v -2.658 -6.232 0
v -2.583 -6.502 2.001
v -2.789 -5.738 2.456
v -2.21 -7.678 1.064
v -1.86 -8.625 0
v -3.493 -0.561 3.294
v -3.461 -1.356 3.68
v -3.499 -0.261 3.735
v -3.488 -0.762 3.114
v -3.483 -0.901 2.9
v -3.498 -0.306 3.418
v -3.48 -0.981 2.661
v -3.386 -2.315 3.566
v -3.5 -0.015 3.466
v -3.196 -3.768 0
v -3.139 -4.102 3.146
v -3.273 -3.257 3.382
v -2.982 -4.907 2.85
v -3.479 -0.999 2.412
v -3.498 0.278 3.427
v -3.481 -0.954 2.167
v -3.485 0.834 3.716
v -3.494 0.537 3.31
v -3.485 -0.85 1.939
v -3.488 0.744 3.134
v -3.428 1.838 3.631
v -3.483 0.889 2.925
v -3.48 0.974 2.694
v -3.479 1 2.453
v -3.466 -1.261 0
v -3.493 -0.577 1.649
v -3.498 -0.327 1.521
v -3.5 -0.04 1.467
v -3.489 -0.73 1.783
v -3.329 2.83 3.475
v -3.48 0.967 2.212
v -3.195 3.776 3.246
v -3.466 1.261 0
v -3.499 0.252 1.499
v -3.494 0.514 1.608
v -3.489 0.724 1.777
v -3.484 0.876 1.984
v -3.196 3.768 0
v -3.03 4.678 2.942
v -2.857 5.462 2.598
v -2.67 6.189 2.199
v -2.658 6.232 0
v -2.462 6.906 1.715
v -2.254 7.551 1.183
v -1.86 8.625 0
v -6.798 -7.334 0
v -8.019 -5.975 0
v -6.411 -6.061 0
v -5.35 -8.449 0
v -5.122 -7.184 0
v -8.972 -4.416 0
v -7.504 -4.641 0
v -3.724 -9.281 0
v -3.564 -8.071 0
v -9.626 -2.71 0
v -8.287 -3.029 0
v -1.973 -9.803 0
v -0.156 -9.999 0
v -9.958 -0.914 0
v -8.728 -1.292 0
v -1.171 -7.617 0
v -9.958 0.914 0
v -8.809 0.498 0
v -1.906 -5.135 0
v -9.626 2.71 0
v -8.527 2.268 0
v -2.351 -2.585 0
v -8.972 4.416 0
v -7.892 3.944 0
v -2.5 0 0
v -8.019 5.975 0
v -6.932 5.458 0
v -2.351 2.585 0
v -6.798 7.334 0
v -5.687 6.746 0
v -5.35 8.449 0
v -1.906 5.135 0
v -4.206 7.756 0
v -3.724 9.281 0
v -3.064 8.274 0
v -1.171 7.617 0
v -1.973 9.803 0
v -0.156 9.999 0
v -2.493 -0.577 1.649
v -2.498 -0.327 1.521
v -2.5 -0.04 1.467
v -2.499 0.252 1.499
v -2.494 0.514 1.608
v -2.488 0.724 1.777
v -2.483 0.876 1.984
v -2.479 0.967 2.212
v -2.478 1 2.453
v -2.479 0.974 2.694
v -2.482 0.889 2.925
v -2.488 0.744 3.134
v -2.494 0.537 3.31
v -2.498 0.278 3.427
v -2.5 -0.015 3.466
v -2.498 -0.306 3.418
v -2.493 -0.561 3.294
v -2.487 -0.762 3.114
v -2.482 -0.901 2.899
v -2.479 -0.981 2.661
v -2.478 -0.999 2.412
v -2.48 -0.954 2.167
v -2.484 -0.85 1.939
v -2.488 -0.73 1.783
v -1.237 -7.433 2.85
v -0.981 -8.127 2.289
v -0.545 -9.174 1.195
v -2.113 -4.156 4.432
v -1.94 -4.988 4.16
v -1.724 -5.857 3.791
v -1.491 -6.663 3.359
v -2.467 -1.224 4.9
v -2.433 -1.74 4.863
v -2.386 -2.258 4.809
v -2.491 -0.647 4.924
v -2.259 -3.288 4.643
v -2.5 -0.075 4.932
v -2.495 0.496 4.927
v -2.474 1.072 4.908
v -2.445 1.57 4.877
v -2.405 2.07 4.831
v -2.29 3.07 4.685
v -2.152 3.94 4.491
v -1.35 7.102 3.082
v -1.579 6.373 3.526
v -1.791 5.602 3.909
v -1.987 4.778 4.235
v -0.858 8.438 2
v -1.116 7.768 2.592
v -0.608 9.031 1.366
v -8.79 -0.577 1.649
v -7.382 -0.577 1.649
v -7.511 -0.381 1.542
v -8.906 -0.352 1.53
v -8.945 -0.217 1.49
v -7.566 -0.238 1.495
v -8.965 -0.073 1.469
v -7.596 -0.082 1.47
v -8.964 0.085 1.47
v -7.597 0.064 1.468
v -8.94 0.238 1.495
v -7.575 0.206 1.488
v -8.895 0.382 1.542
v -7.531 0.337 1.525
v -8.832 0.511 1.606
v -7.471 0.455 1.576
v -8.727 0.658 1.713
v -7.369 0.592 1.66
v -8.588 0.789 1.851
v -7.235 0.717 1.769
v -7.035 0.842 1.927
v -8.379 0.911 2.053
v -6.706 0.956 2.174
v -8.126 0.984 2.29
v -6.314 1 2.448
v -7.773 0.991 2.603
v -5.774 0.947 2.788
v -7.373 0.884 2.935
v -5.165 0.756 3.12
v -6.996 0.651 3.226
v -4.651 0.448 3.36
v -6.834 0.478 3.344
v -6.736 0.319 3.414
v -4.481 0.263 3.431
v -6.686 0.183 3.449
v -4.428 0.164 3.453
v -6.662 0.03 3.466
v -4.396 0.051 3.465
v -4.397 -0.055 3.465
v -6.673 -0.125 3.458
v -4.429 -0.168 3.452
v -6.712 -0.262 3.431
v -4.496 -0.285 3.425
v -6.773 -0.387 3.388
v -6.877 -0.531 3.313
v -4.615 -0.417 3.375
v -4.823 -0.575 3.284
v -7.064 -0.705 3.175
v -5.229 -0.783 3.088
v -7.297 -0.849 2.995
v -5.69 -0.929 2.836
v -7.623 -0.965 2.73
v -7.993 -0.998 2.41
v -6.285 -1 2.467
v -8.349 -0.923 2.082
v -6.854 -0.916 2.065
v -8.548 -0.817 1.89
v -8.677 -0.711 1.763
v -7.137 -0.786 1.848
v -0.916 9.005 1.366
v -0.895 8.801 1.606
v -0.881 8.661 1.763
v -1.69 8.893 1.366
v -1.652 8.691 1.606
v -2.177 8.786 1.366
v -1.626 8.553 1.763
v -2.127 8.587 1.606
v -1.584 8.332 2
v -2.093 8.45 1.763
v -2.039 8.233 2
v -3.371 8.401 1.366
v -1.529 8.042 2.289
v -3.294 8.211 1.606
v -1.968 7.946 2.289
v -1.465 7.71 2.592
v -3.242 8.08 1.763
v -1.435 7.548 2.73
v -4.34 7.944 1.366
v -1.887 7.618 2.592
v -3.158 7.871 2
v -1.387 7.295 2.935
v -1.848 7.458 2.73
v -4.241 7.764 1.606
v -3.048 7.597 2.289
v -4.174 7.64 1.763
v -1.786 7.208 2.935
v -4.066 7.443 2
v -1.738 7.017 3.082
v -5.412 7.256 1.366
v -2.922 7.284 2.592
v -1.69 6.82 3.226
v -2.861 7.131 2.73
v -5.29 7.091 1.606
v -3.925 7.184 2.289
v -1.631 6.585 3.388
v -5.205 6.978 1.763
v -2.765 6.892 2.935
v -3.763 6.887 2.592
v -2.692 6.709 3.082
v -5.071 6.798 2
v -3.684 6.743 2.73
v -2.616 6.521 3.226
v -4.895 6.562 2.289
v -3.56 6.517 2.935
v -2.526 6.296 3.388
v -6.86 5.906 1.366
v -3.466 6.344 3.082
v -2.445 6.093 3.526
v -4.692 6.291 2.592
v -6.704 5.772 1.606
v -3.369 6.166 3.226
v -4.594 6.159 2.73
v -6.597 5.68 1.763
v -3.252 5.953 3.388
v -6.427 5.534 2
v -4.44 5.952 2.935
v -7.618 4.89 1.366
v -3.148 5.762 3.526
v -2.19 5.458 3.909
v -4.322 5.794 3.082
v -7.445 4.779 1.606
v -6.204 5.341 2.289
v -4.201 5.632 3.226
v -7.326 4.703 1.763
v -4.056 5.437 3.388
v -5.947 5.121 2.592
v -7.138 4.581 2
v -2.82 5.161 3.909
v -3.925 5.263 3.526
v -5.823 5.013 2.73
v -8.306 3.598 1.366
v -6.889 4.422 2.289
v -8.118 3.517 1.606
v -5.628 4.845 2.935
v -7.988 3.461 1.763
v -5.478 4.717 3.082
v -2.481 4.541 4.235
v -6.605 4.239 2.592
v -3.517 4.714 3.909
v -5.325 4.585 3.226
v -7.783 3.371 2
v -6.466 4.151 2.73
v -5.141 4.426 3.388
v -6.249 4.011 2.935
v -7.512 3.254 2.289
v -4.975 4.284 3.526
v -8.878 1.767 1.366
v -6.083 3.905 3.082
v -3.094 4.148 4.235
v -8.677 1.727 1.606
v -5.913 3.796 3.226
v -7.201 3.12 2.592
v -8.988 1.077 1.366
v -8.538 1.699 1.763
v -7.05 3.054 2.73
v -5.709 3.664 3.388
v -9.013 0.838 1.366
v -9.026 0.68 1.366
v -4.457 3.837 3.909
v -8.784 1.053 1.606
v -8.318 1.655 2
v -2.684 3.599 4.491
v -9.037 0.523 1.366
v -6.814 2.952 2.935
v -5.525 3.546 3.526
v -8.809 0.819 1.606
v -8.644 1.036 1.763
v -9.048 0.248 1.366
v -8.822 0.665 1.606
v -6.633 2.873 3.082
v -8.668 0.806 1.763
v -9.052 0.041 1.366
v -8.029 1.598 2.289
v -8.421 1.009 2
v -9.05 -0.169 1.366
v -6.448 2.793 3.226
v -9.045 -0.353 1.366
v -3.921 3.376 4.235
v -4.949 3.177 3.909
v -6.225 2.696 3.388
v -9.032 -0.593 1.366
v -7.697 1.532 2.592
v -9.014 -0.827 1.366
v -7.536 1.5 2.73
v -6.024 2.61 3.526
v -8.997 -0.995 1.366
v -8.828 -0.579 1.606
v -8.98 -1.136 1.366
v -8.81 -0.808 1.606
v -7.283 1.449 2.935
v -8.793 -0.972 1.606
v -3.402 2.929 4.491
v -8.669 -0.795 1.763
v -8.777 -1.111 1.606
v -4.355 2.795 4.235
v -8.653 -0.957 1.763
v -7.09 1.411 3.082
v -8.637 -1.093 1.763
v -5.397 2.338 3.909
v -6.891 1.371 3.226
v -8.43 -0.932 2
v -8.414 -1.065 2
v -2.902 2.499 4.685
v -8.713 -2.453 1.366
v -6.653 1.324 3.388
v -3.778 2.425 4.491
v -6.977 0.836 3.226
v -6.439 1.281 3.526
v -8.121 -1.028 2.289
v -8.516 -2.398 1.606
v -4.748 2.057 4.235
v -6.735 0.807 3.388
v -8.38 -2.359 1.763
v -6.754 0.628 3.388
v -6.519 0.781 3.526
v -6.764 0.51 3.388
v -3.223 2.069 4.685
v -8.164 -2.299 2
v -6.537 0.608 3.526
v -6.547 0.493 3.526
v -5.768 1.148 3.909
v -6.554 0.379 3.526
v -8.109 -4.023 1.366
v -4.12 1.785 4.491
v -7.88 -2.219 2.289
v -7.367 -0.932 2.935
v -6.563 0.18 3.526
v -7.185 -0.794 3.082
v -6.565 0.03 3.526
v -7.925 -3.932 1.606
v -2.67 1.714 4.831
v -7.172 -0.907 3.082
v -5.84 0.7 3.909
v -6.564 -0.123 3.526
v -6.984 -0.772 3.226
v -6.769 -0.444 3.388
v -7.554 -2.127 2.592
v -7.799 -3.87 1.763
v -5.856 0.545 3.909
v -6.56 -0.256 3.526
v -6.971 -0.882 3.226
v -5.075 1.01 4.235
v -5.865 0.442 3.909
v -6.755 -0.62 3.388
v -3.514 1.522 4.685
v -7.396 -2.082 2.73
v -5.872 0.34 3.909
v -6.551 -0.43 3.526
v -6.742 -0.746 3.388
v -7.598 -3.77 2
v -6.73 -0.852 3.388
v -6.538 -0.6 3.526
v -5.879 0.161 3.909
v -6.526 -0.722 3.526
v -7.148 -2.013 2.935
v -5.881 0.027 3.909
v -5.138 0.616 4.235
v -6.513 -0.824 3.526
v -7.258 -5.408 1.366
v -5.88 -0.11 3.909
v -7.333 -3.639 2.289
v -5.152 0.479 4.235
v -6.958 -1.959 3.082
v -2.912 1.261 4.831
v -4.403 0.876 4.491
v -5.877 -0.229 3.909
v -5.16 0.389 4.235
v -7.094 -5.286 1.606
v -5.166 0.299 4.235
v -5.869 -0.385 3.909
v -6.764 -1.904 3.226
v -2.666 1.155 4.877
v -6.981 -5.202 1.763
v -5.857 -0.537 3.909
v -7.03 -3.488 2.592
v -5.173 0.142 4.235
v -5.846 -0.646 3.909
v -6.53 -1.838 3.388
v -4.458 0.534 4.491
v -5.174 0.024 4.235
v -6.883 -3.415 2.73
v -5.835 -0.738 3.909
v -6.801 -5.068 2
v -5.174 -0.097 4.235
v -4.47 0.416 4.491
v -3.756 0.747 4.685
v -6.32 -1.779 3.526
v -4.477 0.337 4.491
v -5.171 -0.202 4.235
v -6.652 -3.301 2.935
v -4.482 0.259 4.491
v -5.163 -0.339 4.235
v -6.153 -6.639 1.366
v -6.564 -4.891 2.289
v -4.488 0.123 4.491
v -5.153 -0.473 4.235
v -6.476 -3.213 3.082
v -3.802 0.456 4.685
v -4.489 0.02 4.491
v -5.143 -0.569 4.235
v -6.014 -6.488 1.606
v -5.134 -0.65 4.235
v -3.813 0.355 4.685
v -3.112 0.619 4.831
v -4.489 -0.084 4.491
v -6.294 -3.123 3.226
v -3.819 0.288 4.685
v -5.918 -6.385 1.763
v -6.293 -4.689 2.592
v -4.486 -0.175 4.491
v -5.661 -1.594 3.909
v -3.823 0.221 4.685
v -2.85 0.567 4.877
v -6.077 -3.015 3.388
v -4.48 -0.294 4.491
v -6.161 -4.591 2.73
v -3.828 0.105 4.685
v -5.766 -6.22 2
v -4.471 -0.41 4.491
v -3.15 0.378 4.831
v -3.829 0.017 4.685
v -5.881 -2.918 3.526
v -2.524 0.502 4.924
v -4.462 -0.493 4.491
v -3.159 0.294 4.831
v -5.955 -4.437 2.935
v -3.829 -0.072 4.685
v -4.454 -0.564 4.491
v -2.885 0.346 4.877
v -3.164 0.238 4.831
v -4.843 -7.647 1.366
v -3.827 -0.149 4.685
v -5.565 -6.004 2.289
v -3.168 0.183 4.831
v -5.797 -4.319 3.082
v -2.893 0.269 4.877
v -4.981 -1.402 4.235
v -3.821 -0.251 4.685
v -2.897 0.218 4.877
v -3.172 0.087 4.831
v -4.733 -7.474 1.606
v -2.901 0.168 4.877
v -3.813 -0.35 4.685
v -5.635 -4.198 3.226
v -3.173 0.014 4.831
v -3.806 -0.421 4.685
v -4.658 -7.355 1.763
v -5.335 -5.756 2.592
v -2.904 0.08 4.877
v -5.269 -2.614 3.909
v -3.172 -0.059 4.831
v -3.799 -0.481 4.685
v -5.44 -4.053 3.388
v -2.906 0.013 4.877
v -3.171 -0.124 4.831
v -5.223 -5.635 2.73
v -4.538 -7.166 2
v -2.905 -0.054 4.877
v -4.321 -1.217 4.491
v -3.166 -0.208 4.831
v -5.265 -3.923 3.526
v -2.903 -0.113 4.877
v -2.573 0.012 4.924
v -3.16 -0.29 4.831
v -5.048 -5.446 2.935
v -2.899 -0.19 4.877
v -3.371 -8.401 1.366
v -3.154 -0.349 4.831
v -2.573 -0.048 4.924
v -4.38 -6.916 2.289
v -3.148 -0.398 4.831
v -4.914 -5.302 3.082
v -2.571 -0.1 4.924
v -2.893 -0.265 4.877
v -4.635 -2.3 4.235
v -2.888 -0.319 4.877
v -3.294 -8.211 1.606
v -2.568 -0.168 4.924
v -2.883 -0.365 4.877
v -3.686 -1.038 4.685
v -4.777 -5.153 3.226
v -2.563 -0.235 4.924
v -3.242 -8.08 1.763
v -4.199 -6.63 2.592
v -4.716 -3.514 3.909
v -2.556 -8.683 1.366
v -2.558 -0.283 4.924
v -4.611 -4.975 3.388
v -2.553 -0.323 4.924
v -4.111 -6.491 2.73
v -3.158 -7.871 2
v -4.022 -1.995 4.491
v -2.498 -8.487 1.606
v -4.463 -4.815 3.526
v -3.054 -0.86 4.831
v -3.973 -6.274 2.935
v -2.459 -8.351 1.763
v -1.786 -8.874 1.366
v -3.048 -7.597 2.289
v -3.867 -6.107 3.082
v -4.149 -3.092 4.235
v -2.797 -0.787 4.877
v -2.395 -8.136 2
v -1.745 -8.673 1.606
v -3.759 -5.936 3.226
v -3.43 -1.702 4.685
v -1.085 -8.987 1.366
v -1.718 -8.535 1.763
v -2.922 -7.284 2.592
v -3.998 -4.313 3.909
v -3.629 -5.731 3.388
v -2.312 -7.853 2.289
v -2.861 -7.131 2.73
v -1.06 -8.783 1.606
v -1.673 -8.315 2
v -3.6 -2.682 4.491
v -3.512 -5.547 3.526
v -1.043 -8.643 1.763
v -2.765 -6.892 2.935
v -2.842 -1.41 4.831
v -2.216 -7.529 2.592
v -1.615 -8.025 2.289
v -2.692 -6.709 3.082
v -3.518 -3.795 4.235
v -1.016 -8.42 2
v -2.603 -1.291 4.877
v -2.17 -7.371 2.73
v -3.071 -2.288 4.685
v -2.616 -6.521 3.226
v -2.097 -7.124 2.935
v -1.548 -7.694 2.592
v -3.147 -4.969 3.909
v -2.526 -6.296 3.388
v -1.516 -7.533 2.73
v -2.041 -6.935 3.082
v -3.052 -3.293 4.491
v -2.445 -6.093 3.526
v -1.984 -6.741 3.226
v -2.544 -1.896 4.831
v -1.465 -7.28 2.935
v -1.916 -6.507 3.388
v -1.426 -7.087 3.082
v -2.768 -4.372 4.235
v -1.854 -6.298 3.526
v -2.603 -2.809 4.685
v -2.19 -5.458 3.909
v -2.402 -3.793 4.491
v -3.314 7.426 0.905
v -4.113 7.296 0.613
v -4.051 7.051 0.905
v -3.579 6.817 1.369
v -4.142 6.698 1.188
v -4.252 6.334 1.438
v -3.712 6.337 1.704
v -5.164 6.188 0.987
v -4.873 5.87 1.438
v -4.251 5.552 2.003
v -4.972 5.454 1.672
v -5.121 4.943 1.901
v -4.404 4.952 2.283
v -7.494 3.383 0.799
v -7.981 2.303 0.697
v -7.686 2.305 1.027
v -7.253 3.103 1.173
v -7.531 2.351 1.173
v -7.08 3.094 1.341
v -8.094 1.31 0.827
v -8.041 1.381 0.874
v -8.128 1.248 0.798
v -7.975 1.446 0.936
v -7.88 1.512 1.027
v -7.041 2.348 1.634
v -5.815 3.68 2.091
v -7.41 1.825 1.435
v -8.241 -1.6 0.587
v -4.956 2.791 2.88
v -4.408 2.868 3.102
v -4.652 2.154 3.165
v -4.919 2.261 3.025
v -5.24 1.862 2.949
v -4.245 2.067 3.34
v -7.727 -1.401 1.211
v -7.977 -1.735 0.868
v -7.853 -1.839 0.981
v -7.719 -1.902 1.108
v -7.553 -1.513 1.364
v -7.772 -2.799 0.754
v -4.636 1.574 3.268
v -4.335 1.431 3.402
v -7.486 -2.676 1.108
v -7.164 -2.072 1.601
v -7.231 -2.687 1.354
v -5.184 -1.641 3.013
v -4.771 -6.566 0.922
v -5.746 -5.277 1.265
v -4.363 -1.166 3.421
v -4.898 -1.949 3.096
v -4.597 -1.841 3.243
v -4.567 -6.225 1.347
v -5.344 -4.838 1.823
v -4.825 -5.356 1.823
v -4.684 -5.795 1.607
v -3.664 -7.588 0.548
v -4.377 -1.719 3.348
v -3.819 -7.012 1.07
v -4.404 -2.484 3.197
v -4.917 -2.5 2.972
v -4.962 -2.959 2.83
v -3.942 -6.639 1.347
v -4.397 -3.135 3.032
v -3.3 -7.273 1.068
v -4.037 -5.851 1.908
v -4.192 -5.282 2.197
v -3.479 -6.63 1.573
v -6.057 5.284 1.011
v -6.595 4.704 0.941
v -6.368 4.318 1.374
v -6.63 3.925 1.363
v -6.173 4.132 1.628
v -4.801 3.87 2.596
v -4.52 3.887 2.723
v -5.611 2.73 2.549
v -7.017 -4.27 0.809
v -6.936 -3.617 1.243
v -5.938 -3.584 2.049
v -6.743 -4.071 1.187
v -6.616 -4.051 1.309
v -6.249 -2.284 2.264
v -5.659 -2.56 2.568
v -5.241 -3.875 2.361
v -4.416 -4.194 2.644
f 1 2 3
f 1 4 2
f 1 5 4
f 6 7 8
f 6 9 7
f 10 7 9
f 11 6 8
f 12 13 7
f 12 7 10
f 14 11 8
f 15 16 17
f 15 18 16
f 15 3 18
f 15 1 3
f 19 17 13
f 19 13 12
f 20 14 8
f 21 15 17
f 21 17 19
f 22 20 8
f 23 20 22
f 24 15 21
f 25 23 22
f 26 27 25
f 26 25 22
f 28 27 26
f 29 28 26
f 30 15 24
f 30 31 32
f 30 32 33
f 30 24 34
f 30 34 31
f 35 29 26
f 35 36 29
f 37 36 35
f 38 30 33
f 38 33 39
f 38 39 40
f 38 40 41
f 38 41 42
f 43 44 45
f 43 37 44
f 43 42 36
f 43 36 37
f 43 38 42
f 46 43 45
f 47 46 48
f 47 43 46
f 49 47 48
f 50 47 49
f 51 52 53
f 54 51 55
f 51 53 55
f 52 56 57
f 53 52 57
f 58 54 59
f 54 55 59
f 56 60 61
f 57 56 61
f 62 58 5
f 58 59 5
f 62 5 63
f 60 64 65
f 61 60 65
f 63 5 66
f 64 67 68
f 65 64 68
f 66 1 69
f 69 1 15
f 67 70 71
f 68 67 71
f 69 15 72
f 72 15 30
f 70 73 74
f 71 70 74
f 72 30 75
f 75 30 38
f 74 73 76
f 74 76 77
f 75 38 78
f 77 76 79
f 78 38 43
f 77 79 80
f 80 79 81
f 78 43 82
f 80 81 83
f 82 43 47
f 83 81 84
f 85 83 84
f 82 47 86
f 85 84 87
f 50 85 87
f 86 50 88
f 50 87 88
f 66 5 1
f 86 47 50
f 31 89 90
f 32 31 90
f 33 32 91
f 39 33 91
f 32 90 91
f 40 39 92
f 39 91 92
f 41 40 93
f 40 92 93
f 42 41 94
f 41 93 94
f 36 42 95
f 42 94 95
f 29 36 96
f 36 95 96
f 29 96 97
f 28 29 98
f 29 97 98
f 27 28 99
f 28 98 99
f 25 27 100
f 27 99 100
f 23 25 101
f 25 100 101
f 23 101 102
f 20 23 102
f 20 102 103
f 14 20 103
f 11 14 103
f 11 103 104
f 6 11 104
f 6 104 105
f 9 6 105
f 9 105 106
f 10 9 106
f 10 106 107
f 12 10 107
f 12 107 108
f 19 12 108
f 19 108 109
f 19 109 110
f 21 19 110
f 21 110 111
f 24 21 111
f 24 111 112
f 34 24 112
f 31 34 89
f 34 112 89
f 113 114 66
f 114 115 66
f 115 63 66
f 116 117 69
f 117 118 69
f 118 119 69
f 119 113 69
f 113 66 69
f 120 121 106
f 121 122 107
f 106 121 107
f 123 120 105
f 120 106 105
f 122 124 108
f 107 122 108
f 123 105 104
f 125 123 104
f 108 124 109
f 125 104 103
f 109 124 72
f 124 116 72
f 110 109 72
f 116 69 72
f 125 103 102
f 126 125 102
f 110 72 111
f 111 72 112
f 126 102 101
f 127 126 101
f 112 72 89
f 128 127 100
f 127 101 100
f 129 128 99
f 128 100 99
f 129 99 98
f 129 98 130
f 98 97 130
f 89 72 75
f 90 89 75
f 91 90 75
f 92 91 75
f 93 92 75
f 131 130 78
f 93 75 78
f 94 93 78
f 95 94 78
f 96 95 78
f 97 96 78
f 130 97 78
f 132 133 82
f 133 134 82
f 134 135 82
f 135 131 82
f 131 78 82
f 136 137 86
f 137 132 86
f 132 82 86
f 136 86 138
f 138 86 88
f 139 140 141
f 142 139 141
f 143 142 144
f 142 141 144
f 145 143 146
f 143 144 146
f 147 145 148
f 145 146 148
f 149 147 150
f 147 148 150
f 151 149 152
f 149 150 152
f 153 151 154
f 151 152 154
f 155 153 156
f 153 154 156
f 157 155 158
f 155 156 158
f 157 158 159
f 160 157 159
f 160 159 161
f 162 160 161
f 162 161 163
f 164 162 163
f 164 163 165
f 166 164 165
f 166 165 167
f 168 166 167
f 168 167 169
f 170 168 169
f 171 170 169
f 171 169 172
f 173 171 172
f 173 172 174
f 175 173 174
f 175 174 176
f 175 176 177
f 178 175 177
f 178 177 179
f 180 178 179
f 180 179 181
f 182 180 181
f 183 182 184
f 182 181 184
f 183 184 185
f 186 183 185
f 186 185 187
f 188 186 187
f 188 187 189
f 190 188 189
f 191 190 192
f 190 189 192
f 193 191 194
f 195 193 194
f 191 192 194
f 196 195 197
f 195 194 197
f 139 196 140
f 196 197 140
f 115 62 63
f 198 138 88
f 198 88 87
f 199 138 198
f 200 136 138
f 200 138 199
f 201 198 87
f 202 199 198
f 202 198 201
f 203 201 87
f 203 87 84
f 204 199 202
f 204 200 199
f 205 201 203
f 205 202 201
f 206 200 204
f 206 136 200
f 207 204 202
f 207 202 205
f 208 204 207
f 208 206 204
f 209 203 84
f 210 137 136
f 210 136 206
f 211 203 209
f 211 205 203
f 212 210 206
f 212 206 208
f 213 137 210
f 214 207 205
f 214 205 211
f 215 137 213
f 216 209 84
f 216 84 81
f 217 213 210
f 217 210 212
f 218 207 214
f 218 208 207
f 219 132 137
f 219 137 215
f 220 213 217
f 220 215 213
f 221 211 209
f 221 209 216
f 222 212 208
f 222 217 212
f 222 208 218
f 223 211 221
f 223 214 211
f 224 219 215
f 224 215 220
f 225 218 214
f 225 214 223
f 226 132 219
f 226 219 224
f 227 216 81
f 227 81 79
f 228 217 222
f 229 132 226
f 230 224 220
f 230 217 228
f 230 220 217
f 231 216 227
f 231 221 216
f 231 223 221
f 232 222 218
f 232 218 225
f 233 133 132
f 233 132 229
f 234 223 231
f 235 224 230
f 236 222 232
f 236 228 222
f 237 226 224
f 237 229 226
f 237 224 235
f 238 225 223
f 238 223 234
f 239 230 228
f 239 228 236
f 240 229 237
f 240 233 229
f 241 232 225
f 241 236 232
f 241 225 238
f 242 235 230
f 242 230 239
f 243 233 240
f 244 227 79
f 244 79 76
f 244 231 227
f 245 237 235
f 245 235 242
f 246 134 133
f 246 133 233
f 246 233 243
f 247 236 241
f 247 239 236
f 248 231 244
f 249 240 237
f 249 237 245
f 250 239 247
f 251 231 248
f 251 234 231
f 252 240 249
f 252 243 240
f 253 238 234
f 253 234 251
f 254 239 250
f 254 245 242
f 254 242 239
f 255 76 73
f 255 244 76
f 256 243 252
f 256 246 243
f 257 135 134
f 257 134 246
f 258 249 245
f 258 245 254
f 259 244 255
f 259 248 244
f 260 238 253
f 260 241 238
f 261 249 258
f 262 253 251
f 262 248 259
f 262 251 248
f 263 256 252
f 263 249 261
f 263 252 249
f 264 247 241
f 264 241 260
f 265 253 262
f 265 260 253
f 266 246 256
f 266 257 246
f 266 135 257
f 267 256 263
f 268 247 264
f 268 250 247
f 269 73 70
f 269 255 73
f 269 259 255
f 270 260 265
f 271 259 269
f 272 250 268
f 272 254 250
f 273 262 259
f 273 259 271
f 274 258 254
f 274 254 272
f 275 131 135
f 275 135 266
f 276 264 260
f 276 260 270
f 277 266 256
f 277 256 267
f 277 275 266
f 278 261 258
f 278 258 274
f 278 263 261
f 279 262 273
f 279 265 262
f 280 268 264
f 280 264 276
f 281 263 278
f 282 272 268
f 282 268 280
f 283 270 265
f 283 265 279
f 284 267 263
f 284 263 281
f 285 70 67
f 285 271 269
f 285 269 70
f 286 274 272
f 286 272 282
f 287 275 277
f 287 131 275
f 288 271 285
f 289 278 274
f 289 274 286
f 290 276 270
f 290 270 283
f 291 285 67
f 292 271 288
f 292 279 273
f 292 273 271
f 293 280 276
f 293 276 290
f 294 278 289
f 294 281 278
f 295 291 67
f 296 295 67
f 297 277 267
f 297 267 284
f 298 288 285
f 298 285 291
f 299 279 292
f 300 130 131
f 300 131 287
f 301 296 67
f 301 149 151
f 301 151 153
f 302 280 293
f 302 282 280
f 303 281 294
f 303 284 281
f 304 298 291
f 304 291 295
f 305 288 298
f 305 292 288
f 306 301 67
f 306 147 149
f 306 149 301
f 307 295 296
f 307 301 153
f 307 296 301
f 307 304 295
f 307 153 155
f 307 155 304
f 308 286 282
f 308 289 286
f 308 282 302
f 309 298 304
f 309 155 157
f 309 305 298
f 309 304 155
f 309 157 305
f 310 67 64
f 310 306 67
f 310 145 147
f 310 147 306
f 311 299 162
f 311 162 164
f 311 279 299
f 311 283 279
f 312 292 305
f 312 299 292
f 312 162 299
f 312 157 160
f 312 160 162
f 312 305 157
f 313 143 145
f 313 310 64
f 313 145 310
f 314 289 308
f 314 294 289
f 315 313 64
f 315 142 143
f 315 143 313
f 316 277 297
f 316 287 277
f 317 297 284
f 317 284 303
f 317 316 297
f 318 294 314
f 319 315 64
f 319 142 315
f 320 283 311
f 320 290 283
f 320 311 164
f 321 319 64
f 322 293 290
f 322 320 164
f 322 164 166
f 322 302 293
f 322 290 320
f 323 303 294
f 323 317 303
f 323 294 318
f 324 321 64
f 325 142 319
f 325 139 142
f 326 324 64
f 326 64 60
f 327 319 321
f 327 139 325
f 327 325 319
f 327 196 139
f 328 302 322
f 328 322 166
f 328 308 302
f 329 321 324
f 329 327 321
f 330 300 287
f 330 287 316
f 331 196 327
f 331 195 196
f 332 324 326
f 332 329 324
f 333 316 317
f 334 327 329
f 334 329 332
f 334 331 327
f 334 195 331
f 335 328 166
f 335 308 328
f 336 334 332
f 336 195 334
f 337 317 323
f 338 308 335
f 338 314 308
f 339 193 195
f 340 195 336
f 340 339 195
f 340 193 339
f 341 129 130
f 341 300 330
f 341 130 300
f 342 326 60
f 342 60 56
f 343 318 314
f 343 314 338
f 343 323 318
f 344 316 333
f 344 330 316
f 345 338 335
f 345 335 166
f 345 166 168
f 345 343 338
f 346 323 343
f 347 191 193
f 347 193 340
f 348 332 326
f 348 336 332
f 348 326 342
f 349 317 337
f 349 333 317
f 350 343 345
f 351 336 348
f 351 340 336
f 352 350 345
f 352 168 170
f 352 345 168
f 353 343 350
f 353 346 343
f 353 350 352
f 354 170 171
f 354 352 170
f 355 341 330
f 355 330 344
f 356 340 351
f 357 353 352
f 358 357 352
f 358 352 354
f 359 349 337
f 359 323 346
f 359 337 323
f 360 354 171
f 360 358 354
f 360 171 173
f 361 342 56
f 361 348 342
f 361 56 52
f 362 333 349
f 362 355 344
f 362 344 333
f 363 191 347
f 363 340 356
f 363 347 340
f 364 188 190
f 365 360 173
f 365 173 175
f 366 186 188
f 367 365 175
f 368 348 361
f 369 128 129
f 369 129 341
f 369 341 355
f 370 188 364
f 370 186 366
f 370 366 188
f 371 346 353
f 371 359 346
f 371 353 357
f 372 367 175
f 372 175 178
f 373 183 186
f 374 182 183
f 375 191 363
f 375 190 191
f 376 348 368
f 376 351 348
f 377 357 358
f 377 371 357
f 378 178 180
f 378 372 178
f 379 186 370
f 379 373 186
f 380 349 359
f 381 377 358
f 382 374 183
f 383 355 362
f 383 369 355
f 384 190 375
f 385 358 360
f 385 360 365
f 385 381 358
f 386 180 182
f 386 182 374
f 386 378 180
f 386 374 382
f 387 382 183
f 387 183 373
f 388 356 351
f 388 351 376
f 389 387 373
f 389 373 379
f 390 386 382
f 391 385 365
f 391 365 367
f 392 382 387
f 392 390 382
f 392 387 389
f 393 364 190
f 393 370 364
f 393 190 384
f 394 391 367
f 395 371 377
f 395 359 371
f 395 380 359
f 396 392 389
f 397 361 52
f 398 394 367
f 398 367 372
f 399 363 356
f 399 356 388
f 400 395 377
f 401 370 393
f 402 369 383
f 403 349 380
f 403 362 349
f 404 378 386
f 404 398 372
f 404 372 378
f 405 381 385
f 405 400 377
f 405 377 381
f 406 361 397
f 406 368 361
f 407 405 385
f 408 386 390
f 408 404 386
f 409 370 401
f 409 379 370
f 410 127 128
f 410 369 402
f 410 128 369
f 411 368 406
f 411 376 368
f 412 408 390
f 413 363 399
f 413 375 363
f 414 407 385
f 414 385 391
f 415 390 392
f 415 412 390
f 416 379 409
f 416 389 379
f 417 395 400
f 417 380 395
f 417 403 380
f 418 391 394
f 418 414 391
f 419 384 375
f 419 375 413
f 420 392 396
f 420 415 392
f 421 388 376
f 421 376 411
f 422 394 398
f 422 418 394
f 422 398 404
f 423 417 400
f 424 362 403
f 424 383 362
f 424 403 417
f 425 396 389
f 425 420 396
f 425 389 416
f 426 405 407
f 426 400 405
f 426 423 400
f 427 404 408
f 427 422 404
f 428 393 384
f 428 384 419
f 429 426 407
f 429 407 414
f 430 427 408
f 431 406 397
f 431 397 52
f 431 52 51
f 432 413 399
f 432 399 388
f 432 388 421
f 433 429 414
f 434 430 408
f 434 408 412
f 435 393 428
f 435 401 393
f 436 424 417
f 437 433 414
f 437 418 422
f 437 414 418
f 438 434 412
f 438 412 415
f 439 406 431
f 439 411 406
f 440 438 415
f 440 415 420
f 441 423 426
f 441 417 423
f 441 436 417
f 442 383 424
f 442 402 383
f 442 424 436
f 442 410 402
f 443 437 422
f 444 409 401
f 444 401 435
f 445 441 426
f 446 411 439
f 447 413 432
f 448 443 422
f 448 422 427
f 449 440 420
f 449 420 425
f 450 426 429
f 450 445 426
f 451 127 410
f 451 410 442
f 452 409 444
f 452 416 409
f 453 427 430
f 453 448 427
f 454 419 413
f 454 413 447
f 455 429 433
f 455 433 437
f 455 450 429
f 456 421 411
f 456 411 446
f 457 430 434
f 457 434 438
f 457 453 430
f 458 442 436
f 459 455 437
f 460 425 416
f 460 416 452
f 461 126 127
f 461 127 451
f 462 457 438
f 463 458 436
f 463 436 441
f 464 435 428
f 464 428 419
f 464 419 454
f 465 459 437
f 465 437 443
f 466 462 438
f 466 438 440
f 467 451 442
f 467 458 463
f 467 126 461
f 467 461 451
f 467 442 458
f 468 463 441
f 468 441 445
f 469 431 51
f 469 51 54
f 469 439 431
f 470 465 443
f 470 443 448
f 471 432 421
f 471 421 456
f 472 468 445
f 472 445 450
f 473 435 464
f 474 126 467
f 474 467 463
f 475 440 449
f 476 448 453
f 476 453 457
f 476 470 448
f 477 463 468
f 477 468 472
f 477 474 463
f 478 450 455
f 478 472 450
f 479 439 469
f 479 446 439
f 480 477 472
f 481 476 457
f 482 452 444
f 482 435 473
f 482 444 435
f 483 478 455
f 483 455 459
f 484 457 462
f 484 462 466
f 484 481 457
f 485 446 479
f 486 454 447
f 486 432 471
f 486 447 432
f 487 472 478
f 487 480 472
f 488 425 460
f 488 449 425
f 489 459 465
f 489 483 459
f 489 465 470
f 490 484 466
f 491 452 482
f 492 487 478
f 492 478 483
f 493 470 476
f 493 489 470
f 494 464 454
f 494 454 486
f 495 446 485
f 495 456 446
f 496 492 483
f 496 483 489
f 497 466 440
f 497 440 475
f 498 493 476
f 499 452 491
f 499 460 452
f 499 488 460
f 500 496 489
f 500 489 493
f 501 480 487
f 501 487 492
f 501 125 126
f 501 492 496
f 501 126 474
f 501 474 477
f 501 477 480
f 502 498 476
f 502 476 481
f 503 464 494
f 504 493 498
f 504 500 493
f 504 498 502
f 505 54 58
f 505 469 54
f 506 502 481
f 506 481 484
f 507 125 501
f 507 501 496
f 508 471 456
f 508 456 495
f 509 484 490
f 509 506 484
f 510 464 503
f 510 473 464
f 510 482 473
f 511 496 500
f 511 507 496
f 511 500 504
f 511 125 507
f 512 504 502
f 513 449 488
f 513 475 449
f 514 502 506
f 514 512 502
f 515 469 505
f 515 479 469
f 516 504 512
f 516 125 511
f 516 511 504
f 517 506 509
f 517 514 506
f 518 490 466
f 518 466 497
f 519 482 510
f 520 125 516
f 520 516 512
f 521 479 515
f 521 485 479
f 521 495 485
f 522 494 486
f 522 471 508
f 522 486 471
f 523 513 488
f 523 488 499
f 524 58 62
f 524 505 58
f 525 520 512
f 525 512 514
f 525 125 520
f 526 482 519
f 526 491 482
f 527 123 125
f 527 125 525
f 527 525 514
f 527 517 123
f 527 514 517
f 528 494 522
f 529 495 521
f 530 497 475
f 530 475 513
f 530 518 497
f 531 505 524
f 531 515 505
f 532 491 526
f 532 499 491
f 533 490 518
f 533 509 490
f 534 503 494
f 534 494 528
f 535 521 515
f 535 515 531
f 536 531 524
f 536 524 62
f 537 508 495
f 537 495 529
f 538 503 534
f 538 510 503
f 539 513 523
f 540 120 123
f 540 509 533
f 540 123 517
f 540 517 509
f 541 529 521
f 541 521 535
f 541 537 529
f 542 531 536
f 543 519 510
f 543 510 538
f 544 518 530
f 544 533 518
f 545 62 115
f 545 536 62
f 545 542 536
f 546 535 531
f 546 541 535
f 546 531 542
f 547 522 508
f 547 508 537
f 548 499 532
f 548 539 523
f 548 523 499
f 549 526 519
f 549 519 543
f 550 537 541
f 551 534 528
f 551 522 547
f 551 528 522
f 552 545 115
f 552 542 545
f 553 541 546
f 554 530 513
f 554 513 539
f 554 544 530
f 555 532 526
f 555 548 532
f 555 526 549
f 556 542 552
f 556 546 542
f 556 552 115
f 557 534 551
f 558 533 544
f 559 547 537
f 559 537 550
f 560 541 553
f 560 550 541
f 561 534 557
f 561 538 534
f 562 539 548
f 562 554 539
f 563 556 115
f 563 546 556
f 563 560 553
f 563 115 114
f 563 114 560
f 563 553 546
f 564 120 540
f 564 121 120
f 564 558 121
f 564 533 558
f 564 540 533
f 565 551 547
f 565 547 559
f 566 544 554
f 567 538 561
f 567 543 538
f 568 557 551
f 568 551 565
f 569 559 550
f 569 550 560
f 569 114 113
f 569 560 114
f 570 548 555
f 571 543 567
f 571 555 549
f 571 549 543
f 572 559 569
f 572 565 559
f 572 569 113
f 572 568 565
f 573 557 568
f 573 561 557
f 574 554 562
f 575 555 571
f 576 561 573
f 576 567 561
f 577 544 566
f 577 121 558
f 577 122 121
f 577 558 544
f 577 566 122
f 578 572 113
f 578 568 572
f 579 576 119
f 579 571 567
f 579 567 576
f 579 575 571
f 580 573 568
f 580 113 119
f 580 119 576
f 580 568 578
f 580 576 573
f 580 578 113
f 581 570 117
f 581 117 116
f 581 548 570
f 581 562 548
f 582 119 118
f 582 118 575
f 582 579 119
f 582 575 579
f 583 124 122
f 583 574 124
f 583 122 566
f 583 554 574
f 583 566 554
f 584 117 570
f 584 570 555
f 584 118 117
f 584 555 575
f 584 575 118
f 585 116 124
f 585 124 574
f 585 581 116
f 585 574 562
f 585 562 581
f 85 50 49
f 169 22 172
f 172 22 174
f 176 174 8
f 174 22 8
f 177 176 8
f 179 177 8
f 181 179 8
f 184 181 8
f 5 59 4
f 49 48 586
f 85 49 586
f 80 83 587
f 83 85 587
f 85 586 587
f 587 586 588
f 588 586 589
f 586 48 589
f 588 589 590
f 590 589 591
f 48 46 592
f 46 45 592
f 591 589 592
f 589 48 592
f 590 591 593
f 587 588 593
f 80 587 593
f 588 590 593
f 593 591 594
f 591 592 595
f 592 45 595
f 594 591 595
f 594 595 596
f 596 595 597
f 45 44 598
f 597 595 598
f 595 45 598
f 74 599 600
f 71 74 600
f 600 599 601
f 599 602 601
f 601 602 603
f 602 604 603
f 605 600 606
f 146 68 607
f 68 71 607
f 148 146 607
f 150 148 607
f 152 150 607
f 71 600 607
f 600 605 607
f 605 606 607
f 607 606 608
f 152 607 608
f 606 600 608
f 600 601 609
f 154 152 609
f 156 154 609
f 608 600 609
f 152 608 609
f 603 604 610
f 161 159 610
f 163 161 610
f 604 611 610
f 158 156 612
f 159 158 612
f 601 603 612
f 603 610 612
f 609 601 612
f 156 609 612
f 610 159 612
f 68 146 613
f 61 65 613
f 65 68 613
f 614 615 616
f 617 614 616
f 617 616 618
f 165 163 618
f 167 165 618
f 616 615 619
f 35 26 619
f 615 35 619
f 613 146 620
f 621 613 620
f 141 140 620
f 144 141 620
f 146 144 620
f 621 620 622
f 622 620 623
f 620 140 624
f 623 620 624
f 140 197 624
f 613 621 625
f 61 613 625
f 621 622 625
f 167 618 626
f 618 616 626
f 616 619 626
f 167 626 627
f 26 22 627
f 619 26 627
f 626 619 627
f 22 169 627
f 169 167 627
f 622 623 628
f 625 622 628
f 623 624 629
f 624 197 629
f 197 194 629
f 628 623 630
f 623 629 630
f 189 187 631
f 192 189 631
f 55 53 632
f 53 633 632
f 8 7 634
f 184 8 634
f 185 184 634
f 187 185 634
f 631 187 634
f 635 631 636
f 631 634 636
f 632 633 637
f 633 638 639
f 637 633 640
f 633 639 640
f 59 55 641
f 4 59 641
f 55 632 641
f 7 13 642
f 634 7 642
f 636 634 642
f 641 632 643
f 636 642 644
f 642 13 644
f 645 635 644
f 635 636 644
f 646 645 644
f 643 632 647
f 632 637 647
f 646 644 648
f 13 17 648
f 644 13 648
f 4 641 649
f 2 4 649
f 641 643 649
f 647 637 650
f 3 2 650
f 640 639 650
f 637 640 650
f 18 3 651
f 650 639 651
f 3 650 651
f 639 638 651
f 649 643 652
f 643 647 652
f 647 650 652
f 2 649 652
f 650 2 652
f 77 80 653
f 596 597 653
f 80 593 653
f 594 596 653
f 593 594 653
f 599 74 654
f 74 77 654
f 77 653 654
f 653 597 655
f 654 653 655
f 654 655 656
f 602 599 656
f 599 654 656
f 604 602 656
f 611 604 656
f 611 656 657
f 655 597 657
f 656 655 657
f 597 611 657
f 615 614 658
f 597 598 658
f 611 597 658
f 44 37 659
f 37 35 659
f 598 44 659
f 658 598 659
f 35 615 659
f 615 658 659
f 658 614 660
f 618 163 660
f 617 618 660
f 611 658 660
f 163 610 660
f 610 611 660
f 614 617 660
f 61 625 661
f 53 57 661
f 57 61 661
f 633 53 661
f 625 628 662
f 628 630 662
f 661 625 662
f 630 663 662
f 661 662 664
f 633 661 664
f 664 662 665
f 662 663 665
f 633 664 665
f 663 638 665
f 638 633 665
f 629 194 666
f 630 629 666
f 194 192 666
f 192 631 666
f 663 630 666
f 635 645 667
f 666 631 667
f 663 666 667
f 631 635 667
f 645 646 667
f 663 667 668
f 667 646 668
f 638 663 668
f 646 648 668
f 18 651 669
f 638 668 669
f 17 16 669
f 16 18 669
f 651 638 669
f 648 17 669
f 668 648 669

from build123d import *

# Parameters (mm, degrees)
BOSS_EXTRUDE1_DEPTH = 5
FILLET1_R           = 10
SHELL1_T            = -1
SKETCH4_R           = 1
CUT_EXTRUDE1_DEPTH  = 15.976807967


with BuildPart() as part:
    # Sketch1 → Boss-Extrude1 (new body)
    with BuildSketch(Plane.XY):
        with BuildLine():
            ThreePointArc((-0.15625, 9.998779222), (-10, 0), (-0.15625, -9.998779222))
            ThreePointArc((-0.15625, -9.998779222), (-2.5, 0), (-0.15625, 9.998779222))
        make_face()
    extrude(amount=BOSS_EXTRUDE1_DEPTH)

    # Fillet1
    # the kernel refuses this fillet: 10 mm, written as the material it takes off along each edge
    with BuildSketch(Plane(origin=(0, 0, 5), x_dir=(0.9999950652018581, 0.003141587485880102, 0), z_dir=(0.003141587485880102, -0.9999950652018581, 0))) as fillet1_piece_1:
        with BuildLine():
            CenterArc((1.339745962, -10), FILLET1_R, 30, 60)
            Line((1.339745962, 0), (1.339745962, 0.2))
            Line((1.339745962, 0.2), (10, 0.2))
            Line((10, 0.2), (10.2, 0))
            ThreePointArc((10.2, 0), (10.2, -2.5), (10.173205081, -4.9))
            Line((10.173205081, -4.9), (10, -5))
        make_face()
    revolve(axis=Axis((0, 0, 5), (0, 0, 1)), revolution_arc=359.64, mode=Mode.SUBTRACT)

    # Shell1
    shell1_openings = [part.faces().sort_by_distance(p)[0] for p in [
        (-5.162614347, 0, 0),
    ]]
    offset(amount=SHELL1_T, openings=shell1_openings, kind=Kind.INTERSECTION)

    # Sketch4 → Cut-Extrude1 (cut, through all)
    with BuildSketch(Plane(origin=(0, 0, 0), x_dir=(0, 0, -1), z_dir=(1, 0, 0))):
        with Locations(Location((-2.466231233, 0, 0), (0, 0, 324.775001353))):
            Circle(SKETCH4_R)
    extrude(amount=-CUT_EXTRUDE1_DEPTH, mode=Mode.SUBTRACT)


solid = part.part
